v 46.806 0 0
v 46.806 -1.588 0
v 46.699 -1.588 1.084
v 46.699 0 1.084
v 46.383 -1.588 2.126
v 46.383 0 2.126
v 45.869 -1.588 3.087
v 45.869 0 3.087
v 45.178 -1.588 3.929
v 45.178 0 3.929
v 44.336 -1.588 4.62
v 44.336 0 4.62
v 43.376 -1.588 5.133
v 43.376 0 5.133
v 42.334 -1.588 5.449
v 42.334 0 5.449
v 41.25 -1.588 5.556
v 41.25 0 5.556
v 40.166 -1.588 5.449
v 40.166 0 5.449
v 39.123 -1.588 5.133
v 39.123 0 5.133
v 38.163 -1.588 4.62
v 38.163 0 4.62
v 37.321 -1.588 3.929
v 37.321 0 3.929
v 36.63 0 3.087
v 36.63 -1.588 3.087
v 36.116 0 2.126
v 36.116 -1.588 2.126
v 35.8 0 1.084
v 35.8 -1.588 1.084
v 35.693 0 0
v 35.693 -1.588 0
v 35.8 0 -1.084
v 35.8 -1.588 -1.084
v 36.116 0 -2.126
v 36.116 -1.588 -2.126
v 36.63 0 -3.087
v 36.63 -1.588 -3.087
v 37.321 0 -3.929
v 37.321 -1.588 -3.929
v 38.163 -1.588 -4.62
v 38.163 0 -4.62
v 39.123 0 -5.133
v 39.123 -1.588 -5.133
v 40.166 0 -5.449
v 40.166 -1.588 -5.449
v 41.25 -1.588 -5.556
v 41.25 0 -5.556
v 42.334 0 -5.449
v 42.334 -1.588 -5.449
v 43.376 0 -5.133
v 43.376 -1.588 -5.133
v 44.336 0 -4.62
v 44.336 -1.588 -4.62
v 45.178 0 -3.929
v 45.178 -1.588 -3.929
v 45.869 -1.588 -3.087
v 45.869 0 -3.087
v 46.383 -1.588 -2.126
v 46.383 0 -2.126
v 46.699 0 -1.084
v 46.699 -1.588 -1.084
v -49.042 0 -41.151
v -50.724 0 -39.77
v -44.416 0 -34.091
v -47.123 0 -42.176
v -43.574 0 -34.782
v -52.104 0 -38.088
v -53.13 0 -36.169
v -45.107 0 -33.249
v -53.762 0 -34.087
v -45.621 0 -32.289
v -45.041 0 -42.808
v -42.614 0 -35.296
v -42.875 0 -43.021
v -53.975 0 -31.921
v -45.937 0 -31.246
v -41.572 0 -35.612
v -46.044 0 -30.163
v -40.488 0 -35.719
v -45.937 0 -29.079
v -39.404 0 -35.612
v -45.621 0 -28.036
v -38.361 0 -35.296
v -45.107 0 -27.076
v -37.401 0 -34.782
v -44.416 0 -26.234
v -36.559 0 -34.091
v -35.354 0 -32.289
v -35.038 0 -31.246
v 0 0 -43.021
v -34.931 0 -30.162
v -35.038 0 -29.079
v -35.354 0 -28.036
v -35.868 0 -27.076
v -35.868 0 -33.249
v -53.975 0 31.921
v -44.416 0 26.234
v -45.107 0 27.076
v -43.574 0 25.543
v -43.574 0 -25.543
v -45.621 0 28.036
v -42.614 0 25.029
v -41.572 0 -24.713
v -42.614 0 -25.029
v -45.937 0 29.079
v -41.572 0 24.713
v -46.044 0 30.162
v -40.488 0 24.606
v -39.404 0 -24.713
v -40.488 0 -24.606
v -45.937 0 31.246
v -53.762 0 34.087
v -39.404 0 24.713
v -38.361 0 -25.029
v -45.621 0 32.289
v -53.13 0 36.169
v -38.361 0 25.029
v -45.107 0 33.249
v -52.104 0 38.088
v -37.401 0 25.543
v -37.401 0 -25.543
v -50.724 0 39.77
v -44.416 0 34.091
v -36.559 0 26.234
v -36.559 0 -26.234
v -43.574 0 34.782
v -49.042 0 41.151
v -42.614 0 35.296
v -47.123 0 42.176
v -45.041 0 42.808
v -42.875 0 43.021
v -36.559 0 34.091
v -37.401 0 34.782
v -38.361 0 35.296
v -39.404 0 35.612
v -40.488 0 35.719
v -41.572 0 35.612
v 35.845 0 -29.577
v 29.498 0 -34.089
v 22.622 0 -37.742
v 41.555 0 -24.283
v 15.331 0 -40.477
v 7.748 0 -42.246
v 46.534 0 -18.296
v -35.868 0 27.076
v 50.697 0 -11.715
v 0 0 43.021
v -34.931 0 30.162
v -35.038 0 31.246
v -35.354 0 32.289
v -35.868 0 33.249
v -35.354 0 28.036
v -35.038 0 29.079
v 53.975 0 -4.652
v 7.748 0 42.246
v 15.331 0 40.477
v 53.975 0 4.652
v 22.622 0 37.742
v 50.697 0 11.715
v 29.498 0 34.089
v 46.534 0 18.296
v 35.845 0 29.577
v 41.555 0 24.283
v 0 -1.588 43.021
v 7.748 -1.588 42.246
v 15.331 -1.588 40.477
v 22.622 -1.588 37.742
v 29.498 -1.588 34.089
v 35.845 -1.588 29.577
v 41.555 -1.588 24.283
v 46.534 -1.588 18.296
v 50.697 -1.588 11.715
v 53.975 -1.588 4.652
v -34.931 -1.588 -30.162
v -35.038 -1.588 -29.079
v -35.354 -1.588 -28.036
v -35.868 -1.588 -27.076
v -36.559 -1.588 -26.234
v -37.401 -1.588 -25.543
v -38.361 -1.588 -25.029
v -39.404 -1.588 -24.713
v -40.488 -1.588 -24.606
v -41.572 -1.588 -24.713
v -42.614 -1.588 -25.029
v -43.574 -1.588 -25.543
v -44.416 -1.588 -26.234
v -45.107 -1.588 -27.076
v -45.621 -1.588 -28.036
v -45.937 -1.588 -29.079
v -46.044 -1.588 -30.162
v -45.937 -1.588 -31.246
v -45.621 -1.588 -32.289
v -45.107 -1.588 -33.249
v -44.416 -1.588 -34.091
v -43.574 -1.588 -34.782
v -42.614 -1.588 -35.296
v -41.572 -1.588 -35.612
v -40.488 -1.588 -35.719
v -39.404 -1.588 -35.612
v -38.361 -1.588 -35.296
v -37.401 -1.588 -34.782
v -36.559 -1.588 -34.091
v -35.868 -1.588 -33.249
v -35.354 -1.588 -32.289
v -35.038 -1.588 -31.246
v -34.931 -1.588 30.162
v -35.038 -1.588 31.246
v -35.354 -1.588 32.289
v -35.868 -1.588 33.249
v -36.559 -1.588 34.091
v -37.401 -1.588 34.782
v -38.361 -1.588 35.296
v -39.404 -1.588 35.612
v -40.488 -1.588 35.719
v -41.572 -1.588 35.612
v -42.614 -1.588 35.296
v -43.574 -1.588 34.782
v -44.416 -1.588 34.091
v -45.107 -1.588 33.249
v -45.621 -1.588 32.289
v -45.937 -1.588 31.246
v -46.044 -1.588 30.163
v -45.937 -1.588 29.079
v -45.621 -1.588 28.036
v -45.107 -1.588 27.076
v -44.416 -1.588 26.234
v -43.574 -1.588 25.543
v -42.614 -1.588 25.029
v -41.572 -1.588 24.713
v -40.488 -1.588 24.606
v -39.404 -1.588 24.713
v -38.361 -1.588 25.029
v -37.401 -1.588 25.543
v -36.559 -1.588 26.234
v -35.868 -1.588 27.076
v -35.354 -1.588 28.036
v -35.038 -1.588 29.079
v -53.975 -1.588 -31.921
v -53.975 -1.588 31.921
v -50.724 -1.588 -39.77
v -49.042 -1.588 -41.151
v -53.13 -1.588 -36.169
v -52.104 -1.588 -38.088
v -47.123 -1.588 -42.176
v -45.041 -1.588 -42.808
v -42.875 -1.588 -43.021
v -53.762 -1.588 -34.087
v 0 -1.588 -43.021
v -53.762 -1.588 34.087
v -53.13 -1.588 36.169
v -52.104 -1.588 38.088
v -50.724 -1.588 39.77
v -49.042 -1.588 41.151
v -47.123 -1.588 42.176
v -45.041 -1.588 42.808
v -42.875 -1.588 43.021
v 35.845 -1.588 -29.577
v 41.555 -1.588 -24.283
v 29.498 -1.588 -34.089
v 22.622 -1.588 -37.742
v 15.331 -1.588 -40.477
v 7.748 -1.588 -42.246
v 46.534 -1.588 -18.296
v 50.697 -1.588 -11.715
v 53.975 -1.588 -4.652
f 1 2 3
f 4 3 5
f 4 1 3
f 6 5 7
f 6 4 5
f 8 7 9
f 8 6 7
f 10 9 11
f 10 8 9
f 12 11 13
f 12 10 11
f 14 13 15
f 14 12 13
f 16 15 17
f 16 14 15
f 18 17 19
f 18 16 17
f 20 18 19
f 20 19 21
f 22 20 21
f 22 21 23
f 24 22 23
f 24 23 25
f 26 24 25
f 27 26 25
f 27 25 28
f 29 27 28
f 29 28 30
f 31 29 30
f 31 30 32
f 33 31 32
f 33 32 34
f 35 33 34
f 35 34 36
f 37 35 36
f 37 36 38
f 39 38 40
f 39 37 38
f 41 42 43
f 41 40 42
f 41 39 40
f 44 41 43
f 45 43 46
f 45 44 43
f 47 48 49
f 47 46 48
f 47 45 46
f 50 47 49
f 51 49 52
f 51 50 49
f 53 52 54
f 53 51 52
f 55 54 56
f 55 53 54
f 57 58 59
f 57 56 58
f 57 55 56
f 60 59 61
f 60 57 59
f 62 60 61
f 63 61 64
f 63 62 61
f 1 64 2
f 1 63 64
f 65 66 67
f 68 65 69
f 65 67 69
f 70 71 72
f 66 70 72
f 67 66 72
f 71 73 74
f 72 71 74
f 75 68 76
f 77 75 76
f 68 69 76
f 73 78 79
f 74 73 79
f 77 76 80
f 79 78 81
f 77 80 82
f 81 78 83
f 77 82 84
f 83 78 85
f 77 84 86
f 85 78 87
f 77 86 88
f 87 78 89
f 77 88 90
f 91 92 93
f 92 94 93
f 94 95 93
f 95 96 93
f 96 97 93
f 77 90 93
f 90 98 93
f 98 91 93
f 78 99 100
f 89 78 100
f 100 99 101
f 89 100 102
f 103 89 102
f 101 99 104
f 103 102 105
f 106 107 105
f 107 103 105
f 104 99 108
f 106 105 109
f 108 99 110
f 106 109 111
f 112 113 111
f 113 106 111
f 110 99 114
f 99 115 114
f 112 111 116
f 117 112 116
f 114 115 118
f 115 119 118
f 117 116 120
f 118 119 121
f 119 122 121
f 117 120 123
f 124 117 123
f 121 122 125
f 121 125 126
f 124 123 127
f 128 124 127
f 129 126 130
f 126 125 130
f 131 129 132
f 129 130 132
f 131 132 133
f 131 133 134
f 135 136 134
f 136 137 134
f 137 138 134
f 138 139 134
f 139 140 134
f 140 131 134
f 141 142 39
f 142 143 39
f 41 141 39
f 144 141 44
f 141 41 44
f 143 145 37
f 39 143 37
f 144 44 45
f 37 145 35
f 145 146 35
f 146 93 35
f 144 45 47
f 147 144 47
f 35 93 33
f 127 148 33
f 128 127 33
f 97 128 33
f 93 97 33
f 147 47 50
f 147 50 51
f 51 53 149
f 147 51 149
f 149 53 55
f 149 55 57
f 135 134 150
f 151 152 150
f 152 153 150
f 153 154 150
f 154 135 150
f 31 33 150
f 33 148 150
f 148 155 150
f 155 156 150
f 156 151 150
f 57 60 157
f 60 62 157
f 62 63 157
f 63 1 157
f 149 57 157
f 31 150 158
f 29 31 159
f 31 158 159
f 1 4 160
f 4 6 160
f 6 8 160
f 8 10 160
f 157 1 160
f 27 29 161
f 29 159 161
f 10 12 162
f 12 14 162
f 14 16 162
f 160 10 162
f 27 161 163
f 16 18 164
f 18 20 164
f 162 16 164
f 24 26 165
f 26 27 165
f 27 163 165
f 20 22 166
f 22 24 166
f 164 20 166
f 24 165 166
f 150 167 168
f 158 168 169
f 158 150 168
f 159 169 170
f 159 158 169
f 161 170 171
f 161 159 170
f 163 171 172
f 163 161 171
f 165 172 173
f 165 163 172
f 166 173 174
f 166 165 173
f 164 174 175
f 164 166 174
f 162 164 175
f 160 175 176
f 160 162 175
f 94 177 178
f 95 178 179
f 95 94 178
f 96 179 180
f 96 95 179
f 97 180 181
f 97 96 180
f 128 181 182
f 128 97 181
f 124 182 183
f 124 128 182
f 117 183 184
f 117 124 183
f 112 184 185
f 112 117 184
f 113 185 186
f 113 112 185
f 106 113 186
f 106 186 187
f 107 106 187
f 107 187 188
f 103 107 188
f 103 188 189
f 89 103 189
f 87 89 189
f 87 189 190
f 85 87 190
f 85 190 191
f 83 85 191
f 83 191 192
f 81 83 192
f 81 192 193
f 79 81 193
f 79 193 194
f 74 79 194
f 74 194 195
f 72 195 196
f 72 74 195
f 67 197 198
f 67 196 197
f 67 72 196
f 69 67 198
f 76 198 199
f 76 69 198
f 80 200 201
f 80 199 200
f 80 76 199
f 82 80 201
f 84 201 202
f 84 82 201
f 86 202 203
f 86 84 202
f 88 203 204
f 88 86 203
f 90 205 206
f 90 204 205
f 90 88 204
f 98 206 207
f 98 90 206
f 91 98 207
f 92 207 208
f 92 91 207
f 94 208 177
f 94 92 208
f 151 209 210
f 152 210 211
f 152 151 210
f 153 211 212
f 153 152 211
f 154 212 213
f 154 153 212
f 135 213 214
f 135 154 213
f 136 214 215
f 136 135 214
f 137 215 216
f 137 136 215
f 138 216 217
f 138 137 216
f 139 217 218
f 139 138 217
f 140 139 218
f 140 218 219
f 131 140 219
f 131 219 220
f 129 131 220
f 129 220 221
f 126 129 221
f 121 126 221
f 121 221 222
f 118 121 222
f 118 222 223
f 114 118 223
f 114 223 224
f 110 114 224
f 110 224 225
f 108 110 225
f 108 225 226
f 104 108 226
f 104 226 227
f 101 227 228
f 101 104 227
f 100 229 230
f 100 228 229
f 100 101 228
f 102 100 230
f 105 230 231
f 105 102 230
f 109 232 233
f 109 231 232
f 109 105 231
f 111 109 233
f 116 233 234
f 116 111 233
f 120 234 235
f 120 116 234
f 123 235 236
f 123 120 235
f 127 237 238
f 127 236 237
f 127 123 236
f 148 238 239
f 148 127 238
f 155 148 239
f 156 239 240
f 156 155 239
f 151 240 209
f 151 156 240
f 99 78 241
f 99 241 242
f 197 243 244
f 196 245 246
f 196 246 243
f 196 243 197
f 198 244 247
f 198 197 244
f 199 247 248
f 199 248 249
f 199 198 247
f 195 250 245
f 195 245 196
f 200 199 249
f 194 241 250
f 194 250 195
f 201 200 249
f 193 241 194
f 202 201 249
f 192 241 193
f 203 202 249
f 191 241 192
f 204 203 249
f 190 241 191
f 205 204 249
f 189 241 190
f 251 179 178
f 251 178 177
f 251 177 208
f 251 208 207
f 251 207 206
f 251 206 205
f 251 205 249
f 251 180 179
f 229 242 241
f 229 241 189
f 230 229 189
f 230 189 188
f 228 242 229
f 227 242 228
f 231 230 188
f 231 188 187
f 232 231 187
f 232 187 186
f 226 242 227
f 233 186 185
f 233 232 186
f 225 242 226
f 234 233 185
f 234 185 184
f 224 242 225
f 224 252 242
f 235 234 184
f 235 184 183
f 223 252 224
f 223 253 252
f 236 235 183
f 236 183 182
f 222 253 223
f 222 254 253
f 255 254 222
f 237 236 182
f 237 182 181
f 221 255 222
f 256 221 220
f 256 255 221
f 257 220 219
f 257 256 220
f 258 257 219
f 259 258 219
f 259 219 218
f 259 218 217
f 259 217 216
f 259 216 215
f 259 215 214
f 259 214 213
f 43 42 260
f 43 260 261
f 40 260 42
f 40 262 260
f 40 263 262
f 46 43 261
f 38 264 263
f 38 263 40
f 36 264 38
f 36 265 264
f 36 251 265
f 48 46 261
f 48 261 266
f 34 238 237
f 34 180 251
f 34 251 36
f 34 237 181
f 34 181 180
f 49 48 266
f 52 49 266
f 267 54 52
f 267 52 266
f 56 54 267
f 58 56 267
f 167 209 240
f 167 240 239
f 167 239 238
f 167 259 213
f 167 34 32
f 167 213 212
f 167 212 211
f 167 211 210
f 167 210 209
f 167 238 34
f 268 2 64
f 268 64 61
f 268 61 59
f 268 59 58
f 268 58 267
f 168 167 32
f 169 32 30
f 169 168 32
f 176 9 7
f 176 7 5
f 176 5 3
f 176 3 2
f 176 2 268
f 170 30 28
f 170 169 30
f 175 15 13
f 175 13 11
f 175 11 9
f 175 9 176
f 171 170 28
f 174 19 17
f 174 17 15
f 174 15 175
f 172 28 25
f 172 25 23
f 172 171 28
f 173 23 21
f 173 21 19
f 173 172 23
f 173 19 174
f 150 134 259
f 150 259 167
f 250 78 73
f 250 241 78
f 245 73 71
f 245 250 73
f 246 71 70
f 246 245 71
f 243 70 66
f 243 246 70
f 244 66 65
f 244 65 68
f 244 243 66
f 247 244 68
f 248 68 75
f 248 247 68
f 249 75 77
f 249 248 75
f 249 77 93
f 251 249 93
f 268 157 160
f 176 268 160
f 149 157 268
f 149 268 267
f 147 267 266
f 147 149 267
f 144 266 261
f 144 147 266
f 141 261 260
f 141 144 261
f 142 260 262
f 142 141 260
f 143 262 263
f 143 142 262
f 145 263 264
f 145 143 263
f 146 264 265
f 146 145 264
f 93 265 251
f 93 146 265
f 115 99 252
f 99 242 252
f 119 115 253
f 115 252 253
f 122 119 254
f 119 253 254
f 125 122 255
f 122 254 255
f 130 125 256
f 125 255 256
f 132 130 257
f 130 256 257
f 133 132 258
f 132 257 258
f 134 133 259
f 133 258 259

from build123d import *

# Parameters (mm, degrees)
F0_W     = 107.95
F0_H     = 86.0425
F1_DEPTH = 1.5875
F2_R     = 11.0998
F3_R     = 5.55625
F4_DEPTH = 1.5885
F6_DEPTH = 1.5885


with BuildPart() as f1:
    # F0 (on Front) → F1 (new body)
    with BuildSketch(Plane.XZ):
        Rectangle(F0_W, F0_H)
    extrude(amount=F1_DEPTH)

    # F2
    f2_edges = [f1.edges().sort_by_distance(p)[0] for p in [
        (-53.975, -0.79375, 43.02125),
        (-53.975, -0.79375, -43.02125),
    ]]
    fillet(f2_edges, radius=F2_R)

    # F3 (on Front) → F4 (cut, through all)
    with BuildSketch(Plane.XZ):
        with Locations((-40.4876, 30.1625)):
            Circle(F3_R)
        with Locations((-40.4876, -30.1625)):
            Circle(F3_R)
        with Locations((41.2496, 0)):
            Circle(F3_R)
    extrude(amount=F4_DEPTH, mode=Mode.SUBTRACT)

    # F5 (on Front) → F6 (cut, through all)
    with BuildSketch(Plane.XZ):
        with BuildLine():
            ThreePointArc((0, 43.02125), (34.718835, 30.470606), (55.5625, 0))
            ThreePointArc((55.5625, 0), (34.718835, -30.470606), (0, -43.02125))
            Line((0, -43.02125), (73.436641, -43.02125))
            Line((73.436641, -43.02125), (73.436641, 43.02125))
            Line((73.436641, 43.02125), (0, 43.02125))
        make_face()
    extrude(amount=F6_DEPTH, mode=Mode.SUBTRACT)


solid = f1.part
